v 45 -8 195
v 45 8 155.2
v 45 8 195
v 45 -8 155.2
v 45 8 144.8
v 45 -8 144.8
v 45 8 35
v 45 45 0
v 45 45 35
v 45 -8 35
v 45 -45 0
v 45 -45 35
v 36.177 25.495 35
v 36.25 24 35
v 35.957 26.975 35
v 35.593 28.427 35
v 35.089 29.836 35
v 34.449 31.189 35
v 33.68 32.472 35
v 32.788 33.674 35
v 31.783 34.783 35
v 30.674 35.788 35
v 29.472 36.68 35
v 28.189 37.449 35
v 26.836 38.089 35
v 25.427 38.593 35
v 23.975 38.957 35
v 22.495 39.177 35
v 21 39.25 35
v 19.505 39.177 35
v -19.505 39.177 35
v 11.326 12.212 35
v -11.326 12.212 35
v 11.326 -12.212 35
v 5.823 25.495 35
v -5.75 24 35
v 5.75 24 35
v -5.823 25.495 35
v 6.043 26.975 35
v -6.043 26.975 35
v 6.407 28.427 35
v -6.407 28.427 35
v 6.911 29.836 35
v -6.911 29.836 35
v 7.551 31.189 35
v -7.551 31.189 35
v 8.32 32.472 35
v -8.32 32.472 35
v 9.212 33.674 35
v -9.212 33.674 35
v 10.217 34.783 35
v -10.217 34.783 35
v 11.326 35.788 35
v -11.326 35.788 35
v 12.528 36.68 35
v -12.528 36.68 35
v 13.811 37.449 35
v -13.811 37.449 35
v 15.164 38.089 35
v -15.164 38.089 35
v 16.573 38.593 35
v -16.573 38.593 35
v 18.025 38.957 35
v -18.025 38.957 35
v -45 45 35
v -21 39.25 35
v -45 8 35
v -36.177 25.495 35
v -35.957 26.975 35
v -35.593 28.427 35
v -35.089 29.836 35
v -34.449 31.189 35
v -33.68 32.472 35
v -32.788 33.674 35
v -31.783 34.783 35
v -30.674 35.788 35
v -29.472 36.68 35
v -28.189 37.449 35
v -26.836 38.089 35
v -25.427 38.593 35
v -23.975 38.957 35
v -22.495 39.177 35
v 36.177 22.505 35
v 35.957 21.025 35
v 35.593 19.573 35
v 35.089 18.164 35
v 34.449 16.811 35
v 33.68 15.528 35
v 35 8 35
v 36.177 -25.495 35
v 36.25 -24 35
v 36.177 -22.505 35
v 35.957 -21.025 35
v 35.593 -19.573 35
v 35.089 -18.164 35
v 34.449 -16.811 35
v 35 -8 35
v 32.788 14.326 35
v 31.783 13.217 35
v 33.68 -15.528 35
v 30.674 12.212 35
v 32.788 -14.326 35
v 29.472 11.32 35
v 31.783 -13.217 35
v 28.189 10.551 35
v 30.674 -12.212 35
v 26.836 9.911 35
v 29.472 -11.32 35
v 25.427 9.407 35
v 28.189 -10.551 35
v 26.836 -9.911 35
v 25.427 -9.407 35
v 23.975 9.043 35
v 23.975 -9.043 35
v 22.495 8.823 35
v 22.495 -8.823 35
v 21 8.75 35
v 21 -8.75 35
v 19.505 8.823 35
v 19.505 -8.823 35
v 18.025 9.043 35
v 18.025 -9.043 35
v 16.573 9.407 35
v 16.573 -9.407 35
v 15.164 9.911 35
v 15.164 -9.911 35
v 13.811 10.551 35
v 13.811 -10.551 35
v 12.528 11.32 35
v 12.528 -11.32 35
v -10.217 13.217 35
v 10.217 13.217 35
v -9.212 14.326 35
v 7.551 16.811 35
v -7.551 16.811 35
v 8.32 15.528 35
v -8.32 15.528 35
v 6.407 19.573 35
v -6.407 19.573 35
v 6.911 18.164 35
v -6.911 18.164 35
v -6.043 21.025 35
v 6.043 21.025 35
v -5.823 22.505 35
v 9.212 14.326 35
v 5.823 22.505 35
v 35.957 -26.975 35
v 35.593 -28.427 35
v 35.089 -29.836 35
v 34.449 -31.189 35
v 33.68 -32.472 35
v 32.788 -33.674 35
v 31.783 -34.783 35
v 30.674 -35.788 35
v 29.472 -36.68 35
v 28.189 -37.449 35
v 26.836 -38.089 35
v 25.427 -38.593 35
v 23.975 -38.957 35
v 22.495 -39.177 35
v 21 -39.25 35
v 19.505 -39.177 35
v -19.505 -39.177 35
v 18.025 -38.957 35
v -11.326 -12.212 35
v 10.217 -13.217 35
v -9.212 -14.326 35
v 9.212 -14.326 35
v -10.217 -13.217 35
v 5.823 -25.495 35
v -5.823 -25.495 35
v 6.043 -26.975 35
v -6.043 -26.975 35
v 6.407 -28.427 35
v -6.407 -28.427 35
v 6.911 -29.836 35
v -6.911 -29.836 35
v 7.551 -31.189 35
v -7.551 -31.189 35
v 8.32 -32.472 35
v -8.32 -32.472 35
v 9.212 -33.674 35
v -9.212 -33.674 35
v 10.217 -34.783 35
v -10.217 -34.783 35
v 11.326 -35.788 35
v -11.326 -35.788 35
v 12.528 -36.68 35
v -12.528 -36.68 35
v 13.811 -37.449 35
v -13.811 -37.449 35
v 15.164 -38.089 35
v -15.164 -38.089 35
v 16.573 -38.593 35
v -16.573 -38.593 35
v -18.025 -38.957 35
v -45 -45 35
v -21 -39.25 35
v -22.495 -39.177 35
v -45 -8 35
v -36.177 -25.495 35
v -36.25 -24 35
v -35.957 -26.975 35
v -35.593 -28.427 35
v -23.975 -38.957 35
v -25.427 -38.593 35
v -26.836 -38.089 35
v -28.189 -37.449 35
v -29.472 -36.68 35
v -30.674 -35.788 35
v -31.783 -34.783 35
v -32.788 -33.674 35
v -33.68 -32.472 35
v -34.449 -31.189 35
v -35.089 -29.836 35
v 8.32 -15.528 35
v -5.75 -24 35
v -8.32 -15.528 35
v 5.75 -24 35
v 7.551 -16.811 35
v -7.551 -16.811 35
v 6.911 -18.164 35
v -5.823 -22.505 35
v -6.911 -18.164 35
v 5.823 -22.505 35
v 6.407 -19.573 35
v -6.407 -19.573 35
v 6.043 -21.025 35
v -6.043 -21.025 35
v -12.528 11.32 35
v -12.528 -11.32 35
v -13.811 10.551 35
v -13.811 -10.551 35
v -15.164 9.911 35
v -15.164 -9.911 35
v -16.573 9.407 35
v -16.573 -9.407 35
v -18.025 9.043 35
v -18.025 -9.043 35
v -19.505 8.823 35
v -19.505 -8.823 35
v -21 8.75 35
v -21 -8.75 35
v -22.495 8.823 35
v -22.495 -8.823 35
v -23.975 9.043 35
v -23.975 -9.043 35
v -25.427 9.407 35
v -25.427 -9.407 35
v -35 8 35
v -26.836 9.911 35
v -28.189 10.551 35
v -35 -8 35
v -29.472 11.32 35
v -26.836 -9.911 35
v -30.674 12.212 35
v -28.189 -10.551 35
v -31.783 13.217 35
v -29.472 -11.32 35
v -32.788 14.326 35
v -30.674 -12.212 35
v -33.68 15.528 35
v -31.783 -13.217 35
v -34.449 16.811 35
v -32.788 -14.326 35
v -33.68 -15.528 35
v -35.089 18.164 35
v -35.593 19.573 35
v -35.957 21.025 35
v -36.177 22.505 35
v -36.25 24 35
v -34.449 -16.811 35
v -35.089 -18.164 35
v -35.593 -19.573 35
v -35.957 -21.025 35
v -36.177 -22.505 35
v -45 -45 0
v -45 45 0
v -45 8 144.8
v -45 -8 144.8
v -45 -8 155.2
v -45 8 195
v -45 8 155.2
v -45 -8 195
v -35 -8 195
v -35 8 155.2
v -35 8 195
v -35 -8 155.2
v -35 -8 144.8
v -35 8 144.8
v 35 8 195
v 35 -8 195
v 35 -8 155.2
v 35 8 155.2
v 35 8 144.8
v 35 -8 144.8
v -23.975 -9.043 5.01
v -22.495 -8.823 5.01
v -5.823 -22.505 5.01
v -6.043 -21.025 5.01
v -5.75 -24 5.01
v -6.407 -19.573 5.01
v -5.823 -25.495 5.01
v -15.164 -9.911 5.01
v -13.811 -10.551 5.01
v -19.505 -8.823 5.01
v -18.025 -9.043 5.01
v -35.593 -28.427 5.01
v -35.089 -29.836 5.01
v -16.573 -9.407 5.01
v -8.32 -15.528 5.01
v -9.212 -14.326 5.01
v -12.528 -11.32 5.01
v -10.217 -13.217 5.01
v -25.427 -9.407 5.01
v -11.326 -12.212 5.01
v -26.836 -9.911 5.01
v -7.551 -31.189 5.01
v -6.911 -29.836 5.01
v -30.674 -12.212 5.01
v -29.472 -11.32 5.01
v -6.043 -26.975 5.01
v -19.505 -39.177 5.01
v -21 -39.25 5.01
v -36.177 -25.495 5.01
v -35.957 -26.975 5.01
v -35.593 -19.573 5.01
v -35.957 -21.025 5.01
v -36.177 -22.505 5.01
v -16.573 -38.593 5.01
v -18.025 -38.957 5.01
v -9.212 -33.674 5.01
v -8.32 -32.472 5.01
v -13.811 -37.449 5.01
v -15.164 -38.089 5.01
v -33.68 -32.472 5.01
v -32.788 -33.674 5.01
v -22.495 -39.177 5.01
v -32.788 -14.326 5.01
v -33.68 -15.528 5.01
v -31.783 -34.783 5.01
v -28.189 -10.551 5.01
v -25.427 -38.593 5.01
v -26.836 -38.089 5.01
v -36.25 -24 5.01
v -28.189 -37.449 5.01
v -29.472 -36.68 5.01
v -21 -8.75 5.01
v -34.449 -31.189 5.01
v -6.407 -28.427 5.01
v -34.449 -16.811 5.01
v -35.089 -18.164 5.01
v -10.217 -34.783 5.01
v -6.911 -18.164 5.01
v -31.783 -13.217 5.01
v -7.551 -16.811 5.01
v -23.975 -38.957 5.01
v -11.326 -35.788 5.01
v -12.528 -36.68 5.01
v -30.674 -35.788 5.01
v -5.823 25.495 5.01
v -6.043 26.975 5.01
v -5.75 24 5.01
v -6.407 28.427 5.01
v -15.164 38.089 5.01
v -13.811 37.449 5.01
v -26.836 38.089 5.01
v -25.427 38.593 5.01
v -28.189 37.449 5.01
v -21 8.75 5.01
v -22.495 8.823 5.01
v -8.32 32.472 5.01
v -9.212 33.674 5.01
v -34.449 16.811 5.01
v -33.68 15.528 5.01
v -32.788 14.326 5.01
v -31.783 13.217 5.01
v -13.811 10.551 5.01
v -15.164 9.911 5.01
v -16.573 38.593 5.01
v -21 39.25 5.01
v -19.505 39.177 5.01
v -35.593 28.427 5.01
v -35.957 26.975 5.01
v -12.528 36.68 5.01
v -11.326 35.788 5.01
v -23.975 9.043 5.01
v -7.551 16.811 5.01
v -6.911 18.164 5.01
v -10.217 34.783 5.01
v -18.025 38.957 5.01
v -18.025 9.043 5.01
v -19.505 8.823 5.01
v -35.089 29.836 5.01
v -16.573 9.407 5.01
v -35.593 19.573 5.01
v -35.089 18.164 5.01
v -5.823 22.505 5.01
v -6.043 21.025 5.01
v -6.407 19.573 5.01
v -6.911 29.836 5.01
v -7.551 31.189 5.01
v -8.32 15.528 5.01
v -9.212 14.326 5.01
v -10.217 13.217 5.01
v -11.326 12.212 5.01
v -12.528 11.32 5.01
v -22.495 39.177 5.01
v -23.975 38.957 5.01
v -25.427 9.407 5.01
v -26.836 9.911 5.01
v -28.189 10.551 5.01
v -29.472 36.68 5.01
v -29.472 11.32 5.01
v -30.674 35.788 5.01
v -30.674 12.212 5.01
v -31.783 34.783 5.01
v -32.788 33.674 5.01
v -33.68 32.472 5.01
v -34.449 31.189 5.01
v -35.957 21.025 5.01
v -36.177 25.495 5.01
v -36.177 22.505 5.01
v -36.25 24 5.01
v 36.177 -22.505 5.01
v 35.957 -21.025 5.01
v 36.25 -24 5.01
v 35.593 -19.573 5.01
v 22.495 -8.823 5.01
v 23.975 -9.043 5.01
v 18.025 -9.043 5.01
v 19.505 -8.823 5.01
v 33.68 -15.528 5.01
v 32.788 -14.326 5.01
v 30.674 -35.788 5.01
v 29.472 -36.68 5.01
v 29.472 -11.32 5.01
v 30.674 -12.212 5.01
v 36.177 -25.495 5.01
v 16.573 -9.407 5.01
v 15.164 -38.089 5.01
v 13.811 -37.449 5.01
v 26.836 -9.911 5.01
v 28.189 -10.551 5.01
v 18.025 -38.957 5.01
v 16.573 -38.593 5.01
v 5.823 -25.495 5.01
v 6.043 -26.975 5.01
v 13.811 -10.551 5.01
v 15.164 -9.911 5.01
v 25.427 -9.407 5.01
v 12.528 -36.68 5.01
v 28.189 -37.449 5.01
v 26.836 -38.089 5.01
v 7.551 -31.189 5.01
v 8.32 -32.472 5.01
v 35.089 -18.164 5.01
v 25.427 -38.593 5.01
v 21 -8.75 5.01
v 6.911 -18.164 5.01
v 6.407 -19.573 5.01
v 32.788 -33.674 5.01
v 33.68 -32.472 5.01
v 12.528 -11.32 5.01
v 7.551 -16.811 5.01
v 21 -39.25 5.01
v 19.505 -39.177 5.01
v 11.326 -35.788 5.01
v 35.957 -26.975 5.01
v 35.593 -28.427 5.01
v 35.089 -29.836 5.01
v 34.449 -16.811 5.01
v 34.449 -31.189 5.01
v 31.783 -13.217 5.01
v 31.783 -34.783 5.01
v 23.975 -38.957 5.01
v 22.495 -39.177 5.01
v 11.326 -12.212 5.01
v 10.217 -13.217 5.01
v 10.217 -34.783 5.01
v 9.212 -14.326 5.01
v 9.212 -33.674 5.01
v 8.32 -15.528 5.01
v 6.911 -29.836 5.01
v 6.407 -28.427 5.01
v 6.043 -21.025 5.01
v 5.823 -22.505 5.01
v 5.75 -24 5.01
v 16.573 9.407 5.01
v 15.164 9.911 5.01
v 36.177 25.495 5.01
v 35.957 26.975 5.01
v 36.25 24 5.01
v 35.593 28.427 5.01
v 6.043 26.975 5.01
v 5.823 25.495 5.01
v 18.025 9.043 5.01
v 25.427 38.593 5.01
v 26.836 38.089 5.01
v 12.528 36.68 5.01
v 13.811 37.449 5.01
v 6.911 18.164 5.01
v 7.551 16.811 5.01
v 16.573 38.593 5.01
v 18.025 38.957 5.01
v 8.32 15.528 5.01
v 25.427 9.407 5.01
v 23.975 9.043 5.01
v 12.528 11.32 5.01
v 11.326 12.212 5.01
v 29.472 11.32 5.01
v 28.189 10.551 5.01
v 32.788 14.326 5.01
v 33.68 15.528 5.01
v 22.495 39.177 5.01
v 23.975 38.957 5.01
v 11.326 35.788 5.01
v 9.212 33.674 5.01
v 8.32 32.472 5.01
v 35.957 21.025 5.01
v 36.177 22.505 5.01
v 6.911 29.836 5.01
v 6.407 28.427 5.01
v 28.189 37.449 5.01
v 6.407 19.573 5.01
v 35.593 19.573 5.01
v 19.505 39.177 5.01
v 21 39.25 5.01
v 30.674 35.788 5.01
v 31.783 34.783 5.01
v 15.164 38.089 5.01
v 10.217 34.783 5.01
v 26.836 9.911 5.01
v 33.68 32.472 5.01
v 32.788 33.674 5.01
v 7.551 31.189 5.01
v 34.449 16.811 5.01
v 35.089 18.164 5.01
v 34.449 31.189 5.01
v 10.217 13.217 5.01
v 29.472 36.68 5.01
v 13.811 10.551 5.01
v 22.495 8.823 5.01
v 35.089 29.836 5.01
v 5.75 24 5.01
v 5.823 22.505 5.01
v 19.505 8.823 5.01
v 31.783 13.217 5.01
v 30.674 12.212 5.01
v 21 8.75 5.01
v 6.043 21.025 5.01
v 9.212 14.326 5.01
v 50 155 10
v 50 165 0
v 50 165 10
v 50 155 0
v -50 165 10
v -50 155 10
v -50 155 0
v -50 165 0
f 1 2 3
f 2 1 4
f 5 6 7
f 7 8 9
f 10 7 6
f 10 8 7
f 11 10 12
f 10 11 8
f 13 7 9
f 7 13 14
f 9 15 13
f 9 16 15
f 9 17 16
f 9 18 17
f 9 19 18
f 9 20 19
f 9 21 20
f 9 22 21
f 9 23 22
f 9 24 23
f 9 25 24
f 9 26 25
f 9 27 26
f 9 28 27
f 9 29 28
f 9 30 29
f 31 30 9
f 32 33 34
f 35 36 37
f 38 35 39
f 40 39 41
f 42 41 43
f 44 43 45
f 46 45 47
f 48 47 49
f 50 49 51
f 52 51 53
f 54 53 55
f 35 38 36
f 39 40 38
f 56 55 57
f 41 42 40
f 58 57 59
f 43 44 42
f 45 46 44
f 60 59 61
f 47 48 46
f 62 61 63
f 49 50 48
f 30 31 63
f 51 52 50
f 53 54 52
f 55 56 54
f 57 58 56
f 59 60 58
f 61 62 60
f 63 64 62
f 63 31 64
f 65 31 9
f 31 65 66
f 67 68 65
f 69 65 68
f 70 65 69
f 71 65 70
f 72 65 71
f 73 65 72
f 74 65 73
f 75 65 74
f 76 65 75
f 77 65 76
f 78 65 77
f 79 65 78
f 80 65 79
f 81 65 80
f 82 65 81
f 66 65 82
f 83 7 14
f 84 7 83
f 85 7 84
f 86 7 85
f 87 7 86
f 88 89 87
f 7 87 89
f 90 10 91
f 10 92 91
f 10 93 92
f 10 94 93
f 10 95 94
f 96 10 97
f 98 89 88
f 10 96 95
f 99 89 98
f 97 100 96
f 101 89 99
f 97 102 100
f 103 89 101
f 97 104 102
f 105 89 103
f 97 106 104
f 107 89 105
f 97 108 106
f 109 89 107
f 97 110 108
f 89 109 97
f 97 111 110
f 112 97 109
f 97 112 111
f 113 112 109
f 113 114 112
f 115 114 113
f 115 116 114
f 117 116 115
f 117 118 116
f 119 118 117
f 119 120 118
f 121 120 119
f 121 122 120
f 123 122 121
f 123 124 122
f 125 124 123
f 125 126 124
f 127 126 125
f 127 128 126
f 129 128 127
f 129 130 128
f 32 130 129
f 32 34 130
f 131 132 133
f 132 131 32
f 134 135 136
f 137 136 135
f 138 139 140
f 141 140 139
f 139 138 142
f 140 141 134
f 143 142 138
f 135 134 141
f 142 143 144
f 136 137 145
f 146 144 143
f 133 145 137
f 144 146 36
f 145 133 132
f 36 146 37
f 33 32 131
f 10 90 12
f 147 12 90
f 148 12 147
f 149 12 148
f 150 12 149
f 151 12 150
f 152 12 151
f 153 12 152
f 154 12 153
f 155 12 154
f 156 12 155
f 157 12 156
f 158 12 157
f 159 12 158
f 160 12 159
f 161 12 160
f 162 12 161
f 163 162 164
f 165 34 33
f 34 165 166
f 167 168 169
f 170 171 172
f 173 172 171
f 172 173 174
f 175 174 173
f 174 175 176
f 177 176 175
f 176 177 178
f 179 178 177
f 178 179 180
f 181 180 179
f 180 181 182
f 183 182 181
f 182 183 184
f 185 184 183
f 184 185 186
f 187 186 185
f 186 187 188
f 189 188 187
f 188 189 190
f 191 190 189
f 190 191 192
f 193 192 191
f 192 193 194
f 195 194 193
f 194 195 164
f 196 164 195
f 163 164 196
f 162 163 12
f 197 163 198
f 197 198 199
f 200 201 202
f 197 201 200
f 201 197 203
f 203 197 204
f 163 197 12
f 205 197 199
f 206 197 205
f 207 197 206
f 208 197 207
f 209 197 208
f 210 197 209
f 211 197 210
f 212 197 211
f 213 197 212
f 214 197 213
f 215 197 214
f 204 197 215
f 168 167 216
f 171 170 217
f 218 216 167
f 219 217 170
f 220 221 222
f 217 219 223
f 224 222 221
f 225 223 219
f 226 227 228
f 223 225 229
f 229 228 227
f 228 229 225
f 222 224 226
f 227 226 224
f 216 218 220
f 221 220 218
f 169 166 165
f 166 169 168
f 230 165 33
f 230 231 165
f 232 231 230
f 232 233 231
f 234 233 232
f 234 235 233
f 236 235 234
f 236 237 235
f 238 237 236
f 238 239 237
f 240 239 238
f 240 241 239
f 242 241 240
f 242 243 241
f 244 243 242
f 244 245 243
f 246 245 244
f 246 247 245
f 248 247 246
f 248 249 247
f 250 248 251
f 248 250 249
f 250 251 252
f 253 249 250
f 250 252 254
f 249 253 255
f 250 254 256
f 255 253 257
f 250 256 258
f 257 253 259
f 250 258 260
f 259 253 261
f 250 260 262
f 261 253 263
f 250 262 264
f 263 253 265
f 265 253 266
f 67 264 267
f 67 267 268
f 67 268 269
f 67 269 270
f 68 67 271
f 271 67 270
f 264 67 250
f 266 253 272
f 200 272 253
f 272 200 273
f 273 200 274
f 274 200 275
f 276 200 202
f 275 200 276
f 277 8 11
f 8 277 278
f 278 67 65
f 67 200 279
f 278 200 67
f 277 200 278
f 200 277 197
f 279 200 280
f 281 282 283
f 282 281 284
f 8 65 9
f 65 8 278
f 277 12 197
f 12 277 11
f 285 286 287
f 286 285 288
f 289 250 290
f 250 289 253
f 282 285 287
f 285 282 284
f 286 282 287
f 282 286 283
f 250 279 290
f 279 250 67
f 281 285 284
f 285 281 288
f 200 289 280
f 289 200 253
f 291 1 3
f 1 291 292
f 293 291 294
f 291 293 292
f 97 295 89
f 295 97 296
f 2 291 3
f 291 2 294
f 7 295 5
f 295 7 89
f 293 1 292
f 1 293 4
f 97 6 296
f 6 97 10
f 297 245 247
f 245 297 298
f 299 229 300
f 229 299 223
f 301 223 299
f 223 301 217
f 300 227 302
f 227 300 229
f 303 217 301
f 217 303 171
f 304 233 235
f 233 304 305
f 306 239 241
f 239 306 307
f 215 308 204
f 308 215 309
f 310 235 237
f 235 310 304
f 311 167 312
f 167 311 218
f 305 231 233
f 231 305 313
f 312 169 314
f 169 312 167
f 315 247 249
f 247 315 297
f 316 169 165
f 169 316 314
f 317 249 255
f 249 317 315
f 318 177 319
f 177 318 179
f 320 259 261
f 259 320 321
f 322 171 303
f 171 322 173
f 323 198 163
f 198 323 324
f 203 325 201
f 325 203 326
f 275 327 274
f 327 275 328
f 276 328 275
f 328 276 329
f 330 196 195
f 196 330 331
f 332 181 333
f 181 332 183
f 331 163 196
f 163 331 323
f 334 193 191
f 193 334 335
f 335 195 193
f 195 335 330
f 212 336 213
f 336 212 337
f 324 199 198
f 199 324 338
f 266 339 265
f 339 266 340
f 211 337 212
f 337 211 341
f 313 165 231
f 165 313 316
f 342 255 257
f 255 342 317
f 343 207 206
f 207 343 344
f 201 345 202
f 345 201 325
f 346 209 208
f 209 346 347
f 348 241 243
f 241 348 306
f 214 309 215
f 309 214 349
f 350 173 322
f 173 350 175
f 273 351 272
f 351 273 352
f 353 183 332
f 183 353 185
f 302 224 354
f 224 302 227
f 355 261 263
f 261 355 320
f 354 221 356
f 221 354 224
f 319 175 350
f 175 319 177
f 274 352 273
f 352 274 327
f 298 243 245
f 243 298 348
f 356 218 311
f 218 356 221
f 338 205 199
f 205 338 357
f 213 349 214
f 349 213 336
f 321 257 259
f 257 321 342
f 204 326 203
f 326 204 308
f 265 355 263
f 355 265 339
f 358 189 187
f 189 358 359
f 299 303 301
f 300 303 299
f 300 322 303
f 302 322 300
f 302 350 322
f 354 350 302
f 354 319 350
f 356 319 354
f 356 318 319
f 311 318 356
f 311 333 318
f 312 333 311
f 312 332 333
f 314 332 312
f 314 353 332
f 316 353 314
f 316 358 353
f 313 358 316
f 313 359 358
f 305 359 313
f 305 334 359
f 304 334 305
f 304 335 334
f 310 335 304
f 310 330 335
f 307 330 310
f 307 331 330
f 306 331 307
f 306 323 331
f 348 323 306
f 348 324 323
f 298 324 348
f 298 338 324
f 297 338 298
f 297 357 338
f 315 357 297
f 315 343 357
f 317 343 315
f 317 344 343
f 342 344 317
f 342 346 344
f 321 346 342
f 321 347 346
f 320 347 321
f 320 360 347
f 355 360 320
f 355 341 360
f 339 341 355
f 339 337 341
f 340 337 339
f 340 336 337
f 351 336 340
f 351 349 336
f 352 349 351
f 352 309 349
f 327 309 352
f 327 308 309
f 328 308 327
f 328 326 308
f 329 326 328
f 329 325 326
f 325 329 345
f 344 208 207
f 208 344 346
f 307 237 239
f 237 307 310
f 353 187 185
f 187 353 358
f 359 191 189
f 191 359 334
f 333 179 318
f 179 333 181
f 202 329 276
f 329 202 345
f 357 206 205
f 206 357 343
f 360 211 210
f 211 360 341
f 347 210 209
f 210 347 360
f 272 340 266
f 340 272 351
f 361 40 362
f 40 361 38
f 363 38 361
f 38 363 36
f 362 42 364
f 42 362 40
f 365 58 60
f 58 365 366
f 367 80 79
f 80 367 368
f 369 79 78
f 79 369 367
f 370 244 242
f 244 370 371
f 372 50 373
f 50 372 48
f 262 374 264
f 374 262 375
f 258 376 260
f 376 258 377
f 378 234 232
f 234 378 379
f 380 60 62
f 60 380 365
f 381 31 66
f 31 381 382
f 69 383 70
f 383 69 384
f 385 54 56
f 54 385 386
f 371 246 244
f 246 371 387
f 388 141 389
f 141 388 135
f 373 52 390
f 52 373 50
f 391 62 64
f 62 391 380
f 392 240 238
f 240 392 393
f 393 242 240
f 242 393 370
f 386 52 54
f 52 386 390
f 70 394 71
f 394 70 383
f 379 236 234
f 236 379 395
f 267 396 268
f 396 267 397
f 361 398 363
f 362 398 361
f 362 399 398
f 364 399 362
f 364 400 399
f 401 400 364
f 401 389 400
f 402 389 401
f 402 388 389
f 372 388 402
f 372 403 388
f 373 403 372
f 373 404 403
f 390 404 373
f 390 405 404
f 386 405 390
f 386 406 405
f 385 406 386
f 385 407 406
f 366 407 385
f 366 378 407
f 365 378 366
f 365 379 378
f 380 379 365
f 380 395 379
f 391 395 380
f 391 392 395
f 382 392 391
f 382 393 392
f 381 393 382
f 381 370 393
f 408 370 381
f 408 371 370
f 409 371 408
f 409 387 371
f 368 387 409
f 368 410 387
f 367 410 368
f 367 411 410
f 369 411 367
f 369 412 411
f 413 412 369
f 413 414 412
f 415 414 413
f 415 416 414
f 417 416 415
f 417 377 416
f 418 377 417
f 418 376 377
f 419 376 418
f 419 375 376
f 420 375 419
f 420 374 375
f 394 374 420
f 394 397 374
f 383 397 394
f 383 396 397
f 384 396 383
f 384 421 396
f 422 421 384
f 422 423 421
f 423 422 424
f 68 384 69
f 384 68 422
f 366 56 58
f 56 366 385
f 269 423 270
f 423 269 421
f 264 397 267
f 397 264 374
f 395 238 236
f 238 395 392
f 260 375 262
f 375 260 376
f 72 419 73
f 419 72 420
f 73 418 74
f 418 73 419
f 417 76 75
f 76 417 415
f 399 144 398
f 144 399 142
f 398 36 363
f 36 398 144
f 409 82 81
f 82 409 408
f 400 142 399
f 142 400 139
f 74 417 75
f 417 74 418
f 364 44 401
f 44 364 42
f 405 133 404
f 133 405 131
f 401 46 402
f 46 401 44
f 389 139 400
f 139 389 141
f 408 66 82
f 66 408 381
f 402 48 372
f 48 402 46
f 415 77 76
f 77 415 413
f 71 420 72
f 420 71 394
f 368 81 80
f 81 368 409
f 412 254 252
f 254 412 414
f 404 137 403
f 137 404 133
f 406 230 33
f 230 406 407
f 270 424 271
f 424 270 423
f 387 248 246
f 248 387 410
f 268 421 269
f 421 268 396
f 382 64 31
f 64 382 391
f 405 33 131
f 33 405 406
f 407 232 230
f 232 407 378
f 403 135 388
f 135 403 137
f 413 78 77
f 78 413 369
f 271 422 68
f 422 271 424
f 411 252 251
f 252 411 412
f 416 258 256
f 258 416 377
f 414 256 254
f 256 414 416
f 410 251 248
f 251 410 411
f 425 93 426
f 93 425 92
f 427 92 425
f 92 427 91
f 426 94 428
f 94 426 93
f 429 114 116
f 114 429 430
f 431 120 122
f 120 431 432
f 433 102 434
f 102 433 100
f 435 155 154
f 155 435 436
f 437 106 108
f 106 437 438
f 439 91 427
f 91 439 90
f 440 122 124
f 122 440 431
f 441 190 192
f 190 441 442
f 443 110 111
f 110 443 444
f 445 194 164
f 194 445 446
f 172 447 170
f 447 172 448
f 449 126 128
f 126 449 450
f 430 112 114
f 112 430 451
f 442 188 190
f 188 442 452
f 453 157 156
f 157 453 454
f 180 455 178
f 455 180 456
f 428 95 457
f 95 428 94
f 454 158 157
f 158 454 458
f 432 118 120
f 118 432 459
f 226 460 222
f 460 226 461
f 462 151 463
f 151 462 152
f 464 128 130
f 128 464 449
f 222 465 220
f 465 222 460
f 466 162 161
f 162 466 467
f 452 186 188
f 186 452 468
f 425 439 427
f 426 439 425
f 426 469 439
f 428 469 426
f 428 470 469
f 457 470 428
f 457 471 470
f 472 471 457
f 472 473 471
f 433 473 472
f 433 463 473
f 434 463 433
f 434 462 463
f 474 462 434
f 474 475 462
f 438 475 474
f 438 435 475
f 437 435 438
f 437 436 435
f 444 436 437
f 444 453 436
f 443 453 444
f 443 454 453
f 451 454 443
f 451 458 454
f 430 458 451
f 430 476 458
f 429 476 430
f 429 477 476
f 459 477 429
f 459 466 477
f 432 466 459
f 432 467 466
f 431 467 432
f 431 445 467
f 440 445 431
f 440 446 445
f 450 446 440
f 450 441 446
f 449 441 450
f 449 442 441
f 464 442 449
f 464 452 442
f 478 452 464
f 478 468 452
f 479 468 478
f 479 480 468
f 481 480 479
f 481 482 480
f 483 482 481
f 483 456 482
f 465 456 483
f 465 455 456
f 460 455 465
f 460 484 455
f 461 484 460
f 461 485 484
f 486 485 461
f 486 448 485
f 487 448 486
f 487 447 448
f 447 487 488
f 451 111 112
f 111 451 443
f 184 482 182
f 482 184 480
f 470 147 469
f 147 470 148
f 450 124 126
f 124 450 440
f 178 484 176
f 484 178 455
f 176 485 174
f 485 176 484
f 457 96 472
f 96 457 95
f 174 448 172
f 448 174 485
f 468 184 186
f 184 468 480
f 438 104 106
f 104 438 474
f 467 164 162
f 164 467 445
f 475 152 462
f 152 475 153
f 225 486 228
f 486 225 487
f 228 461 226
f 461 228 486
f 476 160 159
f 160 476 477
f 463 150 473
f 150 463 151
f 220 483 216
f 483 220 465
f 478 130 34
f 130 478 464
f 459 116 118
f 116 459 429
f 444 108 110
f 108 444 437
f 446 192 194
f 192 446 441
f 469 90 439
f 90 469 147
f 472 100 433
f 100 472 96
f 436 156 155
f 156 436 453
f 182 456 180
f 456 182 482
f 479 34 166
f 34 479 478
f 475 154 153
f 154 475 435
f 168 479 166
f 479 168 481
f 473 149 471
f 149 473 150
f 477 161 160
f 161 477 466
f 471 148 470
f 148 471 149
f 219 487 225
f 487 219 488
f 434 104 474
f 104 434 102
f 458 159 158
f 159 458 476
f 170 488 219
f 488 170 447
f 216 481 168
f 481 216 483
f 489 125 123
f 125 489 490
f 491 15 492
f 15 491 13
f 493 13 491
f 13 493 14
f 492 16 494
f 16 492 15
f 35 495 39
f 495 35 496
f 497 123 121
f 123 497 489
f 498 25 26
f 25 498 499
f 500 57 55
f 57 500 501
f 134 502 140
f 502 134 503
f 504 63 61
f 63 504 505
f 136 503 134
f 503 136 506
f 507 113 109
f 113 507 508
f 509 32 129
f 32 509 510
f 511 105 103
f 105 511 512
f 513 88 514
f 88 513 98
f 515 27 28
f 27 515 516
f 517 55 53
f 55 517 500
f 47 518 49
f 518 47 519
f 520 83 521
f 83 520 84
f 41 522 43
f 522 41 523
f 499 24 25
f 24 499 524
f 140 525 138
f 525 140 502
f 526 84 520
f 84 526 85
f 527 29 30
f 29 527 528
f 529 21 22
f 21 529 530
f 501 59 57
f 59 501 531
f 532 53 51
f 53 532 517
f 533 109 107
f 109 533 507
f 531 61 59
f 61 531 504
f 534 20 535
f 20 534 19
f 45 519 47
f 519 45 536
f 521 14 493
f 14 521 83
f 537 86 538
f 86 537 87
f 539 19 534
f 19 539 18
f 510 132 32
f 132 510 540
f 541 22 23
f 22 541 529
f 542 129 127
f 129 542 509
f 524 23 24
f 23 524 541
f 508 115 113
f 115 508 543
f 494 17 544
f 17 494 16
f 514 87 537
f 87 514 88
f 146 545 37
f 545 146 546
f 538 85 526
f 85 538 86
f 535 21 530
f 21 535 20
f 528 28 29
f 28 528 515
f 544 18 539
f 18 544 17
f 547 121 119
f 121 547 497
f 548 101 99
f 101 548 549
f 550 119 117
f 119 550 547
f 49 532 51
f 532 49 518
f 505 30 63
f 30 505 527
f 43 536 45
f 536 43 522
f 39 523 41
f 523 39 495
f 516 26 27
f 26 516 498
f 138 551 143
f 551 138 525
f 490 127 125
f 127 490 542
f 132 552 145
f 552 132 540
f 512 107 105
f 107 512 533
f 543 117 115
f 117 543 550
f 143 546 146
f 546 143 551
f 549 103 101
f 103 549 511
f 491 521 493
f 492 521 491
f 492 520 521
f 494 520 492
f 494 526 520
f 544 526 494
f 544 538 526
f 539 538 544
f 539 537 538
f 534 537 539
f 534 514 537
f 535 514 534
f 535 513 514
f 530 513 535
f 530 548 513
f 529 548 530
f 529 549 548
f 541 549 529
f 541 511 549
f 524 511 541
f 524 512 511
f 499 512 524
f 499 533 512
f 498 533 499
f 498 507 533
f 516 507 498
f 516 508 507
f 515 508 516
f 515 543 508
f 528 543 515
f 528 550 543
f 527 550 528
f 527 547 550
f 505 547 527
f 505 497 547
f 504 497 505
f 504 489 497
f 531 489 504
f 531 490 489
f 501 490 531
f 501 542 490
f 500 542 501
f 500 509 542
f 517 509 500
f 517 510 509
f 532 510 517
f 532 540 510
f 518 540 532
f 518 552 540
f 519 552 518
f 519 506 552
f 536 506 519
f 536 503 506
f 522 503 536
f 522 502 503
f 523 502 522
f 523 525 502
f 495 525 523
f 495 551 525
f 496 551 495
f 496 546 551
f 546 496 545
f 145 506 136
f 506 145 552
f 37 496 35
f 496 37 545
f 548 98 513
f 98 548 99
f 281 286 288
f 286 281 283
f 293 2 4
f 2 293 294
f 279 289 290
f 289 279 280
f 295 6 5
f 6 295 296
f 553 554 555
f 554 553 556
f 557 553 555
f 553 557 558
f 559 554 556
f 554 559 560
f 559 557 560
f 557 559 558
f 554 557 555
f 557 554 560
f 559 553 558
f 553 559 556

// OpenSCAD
// Part 1: Base block with tube seats and vertical posts
// Part 2: Handle bar to be slid through the posts

// --- DIMENSIONS PART 1 ---
base_x      = 90.0;    // Base length (X)
base_y      = 90.0;    // Base width (Y)
base_z      = 35.0;    // Base height (Z)

seat_d      = 30.5;    // Diameter of tube seat
seat_depth  = 30.0;    // Depth of tube seat
seat_floor  = 5.0;     // Remaining floor thickness (35 - 30)

post_x_thick = 10.0;   // Thickness of post along X
post_y_wide  = 16.0;   // Width of post along Y
post_z_high  = 160.0;  // Total height of post from Z=0

hole_sq_d    = 10.4;   // Square hole dimension (X-axis through post)
hole_sq_z    = 150.0;  // Z-height of the square hole center

// --- DIMENSIONS PART 2 ---
handle_x     = 100.0;  // Length of handle (X)
handle_w     = 10.0;   // Width of handle (Y)
handle_h     = 10.0;   // Height of handle (Z)
handle_y_min  = 55.0;  // Y-position start (55 to 65)
handle_y_max  = 65.0;  // Y-position end

// --- CONSTANTS ---
$fn = 64;

// --- PART 1: BASE AND POSTS ---
module part_1() {
    difference() {
        union() {
            // The Base Block
            translate([-base_x/2, -base_y/2, 0])
                cube([base_x, base_y, base_z]);

            // Post 1 (at -X end)
            translate([-base_x/2, -post_y_wide/2, base_z])
                cube([post_x_thick, post_y_wide, post_z_high]);

            // Post 2 (at +X end)
            translate([base_x/2 - post_x_thick, -post_y_wide/2, base_z])
                cube([post_x_thick, post_y_wide, post_z_high]);
        }

        // Tube Seats (Blind holes)
        // Centers: x = -21, 21; y = -24, 24
        // We use a loop for the 4 seats
        for (sx = [-21, 21], sy = [-24, 24]) {
            translate([sx, sy, base_z - seat_depth + 0.01])
                cylinder(h = seat_depth + 0.1, d = seat_d);
        }

        // Square holes through posts
        // Centered at z = 150. Post height is 160 + 35 = 195 total.
        // The hole is "straight through it along X".
        // Since the posts are at the ends, we cut through the whole block width to ensure clean holes.
        translate([-base_x/2 - 1, -post_y_wide/2 - 1, hole_sq_z - hole_sq_d/2])
            cube([base_x + 2, post_y_wide + 2, hole_sq_d]);
    }
}

// --- PART 2: HANDLE ---
module part_2() {
    // The handle is a 10x10 bar, 100mm long.
    // It lies on the bed (Z=0) along X.
    // It spans Y from 55 to 65.
    // Centered on X means X goes from -50 to 50.
    translate([-handle_x/2, handle_y_min, 0])
        cube([handle_x, handle_w, handle_h]);
}

// --- RENDERING ---
// To print, you would comment out one and uncomment the other.
// Currently showing both for visualization.

// Render Part 1
part_1();

// Render Part 2 (Offset for visibility in preview)
translate([0, 100, 0]) part_2();
